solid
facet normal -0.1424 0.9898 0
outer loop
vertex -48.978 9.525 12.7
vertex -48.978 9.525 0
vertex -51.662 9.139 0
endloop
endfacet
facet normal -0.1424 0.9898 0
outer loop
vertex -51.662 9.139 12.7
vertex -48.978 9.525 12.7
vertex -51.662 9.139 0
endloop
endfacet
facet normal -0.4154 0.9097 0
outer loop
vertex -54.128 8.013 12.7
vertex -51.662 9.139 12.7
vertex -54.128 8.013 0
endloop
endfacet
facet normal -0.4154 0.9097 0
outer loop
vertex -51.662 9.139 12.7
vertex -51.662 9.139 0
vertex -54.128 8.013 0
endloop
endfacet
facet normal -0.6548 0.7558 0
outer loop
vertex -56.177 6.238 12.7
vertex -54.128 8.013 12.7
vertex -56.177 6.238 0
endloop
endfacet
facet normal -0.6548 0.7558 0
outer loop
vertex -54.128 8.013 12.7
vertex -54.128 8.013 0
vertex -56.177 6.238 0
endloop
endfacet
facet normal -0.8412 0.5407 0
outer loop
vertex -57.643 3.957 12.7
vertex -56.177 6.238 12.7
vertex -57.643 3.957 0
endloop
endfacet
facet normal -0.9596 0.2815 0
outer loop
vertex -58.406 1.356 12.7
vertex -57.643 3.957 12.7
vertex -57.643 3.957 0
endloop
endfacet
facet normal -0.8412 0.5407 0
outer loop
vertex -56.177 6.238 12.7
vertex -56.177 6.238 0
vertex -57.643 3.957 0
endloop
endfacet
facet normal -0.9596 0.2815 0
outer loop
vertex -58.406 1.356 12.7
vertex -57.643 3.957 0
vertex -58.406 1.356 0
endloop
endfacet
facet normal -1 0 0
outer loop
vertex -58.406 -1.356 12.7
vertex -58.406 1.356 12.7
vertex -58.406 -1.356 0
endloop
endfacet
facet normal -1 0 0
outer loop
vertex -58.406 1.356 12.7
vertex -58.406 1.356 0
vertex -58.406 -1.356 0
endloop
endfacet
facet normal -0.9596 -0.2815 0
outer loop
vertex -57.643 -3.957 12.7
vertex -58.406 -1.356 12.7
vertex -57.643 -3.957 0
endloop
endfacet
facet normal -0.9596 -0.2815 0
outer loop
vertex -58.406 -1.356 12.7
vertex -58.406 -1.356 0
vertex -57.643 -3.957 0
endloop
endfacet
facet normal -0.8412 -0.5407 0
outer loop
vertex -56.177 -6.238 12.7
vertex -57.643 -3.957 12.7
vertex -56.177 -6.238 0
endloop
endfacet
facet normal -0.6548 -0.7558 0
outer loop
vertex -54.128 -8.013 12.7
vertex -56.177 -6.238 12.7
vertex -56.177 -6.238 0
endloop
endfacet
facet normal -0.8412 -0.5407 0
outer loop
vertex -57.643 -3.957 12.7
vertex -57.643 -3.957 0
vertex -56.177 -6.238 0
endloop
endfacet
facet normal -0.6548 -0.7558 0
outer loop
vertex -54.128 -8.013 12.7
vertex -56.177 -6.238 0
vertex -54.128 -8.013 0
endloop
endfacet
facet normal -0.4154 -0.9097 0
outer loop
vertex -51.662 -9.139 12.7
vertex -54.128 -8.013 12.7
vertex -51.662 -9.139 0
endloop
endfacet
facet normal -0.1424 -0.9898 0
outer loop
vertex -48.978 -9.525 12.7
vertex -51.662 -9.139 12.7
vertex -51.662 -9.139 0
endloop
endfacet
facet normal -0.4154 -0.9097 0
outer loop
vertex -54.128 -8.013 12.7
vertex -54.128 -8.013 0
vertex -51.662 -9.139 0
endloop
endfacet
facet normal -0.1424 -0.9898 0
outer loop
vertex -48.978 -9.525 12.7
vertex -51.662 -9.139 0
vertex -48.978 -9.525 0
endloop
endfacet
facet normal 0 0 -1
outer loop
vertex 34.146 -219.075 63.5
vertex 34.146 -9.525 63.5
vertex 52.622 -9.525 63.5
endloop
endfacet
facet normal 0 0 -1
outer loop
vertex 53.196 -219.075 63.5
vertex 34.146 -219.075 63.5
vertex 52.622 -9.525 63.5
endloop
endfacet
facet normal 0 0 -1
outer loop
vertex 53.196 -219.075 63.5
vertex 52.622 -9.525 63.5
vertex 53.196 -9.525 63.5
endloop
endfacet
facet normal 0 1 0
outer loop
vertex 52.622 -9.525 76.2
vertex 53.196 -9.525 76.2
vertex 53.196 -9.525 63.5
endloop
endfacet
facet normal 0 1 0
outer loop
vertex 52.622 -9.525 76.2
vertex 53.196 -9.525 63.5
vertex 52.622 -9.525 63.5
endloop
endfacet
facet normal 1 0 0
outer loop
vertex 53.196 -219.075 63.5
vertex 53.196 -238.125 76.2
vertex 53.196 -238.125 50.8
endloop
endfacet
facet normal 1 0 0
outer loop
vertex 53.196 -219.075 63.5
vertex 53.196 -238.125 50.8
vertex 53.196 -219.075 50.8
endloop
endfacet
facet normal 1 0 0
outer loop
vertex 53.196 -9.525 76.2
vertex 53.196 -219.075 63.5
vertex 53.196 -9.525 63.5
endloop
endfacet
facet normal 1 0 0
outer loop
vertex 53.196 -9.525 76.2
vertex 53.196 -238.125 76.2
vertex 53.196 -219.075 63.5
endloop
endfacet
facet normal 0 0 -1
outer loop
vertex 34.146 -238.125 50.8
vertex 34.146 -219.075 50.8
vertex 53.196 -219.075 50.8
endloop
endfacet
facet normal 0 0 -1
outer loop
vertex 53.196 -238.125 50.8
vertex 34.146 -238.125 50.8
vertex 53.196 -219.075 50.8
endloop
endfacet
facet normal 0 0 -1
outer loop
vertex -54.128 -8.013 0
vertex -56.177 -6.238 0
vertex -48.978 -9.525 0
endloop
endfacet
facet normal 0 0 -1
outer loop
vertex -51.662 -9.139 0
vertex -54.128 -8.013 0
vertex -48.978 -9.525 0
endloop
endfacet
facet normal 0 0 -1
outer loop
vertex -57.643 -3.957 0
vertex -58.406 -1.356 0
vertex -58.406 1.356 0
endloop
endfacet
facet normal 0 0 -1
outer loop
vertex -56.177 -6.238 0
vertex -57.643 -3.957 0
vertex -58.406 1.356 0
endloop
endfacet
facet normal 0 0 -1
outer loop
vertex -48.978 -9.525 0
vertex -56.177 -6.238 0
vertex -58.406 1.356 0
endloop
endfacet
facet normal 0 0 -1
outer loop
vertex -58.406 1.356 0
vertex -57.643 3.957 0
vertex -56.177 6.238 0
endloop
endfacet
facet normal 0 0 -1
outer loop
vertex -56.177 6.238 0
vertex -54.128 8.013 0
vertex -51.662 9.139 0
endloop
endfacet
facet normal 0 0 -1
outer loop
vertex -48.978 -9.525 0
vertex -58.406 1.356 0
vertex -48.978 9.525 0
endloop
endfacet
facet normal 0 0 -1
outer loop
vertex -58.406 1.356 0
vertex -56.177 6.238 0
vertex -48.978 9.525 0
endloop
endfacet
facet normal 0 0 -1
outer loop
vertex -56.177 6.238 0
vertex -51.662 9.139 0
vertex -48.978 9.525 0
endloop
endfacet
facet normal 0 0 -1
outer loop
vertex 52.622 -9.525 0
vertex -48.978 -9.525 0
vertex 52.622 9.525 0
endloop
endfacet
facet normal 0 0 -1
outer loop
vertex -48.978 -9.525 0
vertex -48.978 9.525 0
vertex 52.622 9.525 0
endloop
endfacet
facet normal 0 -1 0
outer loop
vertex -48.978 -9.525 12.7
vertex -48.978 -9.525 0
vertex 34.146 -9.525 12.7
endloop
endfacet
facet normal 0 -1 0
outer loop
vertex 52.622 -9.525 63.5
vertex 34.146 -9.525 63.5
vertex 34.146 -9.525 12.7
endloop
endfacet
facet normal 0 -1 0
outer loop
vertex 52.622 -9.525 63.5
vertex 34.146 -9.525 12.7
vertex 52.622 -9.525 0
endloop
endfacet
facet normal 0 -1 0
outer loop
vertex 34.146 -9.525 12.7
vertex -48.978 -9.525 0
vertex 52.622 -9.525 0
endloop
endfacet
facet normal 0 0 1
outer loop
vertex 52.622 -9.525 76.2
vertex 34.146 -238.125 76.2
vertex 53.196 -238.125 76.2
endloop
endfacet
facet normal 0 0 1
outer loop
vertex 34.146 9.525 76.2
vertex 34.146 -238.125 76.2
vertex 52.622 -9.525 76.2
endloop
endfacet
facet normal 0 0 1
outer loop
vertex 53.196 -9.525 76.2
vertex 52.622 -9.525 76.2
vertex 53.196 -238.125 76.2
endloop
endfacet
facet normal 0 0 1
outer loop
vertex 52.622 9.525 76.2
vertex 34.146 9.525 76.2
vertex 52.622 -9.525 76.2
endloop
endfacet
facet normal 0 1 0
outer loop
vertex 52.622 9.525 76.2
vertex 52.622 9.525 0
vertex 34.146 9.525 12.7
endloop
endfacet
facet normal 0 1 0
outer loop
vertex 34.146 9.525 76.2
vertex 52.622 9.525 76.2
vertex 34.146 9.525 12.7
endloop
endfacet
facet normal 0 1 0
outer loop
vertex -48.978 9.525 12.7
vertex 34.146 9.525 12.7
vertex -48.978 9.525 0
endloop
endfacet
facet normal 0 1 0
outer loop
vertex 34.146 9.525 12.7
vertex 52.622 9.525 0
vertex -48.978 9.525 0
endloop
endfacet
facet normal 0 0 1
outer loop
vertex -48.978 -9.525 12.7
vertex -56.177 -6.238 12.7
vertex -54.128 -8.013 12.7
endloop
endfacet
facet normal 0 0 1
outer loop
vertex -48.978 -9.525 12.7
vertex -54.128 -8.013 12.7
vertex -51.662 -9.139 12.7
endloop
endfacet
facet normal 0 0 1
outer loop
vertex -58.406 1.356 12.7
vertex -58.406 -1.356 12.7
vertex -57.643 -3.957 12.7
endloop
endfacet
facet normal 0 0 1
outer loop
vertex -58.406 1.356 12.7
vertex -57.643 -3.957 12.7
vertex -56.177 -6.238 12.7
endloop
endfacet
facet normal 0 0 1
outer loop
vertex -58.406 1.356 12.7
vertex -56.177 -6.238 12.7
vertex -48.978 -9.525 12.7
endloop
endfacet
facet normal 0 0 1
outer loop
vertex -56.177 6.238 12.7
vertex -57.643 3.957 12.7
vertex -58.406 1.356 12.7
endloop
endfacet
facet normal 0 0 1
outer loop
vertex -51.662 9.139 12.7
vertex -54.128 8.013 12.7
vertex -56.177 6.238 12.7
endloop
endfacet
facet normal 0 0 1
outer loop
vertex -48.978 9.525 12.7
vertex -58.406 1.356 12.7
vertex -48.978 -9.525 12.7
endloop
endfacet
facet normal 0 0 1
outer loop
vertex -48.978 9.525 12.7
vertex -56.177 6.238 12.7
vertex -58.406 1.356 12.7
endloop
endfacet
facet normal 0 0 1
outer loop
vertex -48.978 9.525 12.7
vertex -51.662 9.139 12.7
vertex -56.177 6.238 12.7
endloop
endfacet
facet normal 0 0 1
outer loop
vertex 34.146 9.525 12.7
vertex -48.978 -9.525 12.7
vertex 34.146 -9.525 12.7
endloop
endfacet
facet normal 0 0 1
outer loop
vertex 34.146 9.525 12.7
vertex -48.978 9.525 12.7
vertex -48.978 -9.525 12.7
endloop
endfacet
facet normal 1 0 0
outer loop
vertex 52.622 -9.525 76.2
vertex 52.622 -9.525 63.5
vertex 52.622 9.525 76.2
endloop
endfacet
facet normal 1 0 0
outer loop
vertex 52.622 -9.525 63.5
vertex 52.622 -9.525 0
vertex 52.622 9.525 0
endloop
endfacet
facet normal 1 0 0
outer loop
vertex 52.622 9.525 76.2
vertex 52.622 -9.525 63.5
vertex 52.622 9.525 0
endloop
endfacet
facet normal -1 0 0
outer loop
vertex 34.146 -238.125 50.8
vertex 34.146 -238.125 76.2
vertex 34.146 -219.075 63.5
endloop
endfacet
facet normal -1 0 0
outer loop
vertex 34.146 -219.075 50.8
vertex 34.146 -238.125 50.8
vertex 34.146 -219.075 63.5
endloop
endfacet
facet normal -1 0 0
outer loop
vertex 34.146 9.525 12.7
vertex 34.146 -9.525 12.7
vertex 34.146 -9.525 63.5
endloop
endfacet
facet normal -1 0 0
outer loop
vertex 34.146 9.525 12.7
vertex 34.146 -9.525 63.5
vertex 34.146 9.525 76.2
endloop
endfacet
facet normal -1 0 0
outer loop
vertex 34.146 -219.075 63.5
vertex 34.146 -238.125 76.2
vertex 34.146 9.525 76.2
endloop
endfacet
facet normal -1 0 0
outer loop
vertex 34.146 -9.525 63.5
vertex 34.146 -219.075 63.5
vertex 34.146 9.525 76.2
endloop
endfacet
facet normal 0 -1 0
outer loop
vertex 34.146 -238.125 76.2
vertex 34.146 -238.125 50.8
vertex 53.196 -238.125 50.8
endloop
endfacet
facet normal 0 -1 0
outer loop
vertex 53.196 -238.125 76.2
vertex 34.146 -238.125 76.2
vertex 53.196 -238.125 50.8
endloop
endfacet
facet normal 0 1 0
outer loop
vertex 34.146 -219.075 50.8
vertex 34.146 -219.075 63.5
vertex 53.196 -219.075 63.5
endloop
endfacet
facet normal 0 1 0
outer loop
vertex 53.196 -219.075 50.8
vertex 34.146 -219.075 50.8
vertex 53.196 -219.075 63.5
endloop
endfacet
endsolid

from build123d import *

# Parameters (mm, degrees)
F0_W     = 18.4755190939
F0_H     = 19.05
F1_DEPTH = 12.7
F2_DEPTH = 76.2
F4_DEPTH = 12.7
F3_W     = 19.05
F3_H     = 19.05
F5_DEPTH = 25.4


# Not quite as in the source:
# - a feature names something its author has since deleted; it is built from what else it names


with BuildPart() as f1:
    # F0 (on Top) → F1 (new body)
    with BuildSketch(Plane.XY):
        with BuildLine():
            Line((34.1462217655, 9.525), (-48.9782591407, 9.525))
            ThreePointArc((-48.9782591407, 9.525), (-58.5032591407, 0), (-48.9782591407, -9.525))
            Line((-48.9782591407, -9.525), (34.1462217655, -9.525))
            Line((34.1462217655, -9.525), (34.1462217655, 9.525))
        make_face()
        with Locations((43.3839813124, 0)):
            Rectangle(F0_W, F0_H)
    extrude(amount=F1_DEPTH)

    # F0 (on Top) → F2 (join)
    with BuildSketch(Plane.XY):
        with Locations((43.3839813124, 0)):
            Rectangle(F0_W, F0_H)
    extrude(amount=F2_DEPTH)

    # F3 (on face) → F4 (join)
    with BuildSketch(Plane.XY.offset(76.2)):
        Polygon((52.6217408593, -9.525), (34.1462217655, -9.525), (34.1462217655, -219.075), (53.1962217655, -219.075), (53.1962217655, -9.525), align=None)
    extrude(amount=-F4_DEPTH)

    # F3 (on face) → F5 (join)
    with BuildSketch(Plane.XY.offset(76.2)):
        with Locations((43.6712217655, -228.6)):
            Rectangle(F3_W, F3_H)
    extrude(amount=-F5_DEPTH)


with BuildPart() as f6_1:
    # F6: copy of F1
    add(f1.part)


solid = f1.part
